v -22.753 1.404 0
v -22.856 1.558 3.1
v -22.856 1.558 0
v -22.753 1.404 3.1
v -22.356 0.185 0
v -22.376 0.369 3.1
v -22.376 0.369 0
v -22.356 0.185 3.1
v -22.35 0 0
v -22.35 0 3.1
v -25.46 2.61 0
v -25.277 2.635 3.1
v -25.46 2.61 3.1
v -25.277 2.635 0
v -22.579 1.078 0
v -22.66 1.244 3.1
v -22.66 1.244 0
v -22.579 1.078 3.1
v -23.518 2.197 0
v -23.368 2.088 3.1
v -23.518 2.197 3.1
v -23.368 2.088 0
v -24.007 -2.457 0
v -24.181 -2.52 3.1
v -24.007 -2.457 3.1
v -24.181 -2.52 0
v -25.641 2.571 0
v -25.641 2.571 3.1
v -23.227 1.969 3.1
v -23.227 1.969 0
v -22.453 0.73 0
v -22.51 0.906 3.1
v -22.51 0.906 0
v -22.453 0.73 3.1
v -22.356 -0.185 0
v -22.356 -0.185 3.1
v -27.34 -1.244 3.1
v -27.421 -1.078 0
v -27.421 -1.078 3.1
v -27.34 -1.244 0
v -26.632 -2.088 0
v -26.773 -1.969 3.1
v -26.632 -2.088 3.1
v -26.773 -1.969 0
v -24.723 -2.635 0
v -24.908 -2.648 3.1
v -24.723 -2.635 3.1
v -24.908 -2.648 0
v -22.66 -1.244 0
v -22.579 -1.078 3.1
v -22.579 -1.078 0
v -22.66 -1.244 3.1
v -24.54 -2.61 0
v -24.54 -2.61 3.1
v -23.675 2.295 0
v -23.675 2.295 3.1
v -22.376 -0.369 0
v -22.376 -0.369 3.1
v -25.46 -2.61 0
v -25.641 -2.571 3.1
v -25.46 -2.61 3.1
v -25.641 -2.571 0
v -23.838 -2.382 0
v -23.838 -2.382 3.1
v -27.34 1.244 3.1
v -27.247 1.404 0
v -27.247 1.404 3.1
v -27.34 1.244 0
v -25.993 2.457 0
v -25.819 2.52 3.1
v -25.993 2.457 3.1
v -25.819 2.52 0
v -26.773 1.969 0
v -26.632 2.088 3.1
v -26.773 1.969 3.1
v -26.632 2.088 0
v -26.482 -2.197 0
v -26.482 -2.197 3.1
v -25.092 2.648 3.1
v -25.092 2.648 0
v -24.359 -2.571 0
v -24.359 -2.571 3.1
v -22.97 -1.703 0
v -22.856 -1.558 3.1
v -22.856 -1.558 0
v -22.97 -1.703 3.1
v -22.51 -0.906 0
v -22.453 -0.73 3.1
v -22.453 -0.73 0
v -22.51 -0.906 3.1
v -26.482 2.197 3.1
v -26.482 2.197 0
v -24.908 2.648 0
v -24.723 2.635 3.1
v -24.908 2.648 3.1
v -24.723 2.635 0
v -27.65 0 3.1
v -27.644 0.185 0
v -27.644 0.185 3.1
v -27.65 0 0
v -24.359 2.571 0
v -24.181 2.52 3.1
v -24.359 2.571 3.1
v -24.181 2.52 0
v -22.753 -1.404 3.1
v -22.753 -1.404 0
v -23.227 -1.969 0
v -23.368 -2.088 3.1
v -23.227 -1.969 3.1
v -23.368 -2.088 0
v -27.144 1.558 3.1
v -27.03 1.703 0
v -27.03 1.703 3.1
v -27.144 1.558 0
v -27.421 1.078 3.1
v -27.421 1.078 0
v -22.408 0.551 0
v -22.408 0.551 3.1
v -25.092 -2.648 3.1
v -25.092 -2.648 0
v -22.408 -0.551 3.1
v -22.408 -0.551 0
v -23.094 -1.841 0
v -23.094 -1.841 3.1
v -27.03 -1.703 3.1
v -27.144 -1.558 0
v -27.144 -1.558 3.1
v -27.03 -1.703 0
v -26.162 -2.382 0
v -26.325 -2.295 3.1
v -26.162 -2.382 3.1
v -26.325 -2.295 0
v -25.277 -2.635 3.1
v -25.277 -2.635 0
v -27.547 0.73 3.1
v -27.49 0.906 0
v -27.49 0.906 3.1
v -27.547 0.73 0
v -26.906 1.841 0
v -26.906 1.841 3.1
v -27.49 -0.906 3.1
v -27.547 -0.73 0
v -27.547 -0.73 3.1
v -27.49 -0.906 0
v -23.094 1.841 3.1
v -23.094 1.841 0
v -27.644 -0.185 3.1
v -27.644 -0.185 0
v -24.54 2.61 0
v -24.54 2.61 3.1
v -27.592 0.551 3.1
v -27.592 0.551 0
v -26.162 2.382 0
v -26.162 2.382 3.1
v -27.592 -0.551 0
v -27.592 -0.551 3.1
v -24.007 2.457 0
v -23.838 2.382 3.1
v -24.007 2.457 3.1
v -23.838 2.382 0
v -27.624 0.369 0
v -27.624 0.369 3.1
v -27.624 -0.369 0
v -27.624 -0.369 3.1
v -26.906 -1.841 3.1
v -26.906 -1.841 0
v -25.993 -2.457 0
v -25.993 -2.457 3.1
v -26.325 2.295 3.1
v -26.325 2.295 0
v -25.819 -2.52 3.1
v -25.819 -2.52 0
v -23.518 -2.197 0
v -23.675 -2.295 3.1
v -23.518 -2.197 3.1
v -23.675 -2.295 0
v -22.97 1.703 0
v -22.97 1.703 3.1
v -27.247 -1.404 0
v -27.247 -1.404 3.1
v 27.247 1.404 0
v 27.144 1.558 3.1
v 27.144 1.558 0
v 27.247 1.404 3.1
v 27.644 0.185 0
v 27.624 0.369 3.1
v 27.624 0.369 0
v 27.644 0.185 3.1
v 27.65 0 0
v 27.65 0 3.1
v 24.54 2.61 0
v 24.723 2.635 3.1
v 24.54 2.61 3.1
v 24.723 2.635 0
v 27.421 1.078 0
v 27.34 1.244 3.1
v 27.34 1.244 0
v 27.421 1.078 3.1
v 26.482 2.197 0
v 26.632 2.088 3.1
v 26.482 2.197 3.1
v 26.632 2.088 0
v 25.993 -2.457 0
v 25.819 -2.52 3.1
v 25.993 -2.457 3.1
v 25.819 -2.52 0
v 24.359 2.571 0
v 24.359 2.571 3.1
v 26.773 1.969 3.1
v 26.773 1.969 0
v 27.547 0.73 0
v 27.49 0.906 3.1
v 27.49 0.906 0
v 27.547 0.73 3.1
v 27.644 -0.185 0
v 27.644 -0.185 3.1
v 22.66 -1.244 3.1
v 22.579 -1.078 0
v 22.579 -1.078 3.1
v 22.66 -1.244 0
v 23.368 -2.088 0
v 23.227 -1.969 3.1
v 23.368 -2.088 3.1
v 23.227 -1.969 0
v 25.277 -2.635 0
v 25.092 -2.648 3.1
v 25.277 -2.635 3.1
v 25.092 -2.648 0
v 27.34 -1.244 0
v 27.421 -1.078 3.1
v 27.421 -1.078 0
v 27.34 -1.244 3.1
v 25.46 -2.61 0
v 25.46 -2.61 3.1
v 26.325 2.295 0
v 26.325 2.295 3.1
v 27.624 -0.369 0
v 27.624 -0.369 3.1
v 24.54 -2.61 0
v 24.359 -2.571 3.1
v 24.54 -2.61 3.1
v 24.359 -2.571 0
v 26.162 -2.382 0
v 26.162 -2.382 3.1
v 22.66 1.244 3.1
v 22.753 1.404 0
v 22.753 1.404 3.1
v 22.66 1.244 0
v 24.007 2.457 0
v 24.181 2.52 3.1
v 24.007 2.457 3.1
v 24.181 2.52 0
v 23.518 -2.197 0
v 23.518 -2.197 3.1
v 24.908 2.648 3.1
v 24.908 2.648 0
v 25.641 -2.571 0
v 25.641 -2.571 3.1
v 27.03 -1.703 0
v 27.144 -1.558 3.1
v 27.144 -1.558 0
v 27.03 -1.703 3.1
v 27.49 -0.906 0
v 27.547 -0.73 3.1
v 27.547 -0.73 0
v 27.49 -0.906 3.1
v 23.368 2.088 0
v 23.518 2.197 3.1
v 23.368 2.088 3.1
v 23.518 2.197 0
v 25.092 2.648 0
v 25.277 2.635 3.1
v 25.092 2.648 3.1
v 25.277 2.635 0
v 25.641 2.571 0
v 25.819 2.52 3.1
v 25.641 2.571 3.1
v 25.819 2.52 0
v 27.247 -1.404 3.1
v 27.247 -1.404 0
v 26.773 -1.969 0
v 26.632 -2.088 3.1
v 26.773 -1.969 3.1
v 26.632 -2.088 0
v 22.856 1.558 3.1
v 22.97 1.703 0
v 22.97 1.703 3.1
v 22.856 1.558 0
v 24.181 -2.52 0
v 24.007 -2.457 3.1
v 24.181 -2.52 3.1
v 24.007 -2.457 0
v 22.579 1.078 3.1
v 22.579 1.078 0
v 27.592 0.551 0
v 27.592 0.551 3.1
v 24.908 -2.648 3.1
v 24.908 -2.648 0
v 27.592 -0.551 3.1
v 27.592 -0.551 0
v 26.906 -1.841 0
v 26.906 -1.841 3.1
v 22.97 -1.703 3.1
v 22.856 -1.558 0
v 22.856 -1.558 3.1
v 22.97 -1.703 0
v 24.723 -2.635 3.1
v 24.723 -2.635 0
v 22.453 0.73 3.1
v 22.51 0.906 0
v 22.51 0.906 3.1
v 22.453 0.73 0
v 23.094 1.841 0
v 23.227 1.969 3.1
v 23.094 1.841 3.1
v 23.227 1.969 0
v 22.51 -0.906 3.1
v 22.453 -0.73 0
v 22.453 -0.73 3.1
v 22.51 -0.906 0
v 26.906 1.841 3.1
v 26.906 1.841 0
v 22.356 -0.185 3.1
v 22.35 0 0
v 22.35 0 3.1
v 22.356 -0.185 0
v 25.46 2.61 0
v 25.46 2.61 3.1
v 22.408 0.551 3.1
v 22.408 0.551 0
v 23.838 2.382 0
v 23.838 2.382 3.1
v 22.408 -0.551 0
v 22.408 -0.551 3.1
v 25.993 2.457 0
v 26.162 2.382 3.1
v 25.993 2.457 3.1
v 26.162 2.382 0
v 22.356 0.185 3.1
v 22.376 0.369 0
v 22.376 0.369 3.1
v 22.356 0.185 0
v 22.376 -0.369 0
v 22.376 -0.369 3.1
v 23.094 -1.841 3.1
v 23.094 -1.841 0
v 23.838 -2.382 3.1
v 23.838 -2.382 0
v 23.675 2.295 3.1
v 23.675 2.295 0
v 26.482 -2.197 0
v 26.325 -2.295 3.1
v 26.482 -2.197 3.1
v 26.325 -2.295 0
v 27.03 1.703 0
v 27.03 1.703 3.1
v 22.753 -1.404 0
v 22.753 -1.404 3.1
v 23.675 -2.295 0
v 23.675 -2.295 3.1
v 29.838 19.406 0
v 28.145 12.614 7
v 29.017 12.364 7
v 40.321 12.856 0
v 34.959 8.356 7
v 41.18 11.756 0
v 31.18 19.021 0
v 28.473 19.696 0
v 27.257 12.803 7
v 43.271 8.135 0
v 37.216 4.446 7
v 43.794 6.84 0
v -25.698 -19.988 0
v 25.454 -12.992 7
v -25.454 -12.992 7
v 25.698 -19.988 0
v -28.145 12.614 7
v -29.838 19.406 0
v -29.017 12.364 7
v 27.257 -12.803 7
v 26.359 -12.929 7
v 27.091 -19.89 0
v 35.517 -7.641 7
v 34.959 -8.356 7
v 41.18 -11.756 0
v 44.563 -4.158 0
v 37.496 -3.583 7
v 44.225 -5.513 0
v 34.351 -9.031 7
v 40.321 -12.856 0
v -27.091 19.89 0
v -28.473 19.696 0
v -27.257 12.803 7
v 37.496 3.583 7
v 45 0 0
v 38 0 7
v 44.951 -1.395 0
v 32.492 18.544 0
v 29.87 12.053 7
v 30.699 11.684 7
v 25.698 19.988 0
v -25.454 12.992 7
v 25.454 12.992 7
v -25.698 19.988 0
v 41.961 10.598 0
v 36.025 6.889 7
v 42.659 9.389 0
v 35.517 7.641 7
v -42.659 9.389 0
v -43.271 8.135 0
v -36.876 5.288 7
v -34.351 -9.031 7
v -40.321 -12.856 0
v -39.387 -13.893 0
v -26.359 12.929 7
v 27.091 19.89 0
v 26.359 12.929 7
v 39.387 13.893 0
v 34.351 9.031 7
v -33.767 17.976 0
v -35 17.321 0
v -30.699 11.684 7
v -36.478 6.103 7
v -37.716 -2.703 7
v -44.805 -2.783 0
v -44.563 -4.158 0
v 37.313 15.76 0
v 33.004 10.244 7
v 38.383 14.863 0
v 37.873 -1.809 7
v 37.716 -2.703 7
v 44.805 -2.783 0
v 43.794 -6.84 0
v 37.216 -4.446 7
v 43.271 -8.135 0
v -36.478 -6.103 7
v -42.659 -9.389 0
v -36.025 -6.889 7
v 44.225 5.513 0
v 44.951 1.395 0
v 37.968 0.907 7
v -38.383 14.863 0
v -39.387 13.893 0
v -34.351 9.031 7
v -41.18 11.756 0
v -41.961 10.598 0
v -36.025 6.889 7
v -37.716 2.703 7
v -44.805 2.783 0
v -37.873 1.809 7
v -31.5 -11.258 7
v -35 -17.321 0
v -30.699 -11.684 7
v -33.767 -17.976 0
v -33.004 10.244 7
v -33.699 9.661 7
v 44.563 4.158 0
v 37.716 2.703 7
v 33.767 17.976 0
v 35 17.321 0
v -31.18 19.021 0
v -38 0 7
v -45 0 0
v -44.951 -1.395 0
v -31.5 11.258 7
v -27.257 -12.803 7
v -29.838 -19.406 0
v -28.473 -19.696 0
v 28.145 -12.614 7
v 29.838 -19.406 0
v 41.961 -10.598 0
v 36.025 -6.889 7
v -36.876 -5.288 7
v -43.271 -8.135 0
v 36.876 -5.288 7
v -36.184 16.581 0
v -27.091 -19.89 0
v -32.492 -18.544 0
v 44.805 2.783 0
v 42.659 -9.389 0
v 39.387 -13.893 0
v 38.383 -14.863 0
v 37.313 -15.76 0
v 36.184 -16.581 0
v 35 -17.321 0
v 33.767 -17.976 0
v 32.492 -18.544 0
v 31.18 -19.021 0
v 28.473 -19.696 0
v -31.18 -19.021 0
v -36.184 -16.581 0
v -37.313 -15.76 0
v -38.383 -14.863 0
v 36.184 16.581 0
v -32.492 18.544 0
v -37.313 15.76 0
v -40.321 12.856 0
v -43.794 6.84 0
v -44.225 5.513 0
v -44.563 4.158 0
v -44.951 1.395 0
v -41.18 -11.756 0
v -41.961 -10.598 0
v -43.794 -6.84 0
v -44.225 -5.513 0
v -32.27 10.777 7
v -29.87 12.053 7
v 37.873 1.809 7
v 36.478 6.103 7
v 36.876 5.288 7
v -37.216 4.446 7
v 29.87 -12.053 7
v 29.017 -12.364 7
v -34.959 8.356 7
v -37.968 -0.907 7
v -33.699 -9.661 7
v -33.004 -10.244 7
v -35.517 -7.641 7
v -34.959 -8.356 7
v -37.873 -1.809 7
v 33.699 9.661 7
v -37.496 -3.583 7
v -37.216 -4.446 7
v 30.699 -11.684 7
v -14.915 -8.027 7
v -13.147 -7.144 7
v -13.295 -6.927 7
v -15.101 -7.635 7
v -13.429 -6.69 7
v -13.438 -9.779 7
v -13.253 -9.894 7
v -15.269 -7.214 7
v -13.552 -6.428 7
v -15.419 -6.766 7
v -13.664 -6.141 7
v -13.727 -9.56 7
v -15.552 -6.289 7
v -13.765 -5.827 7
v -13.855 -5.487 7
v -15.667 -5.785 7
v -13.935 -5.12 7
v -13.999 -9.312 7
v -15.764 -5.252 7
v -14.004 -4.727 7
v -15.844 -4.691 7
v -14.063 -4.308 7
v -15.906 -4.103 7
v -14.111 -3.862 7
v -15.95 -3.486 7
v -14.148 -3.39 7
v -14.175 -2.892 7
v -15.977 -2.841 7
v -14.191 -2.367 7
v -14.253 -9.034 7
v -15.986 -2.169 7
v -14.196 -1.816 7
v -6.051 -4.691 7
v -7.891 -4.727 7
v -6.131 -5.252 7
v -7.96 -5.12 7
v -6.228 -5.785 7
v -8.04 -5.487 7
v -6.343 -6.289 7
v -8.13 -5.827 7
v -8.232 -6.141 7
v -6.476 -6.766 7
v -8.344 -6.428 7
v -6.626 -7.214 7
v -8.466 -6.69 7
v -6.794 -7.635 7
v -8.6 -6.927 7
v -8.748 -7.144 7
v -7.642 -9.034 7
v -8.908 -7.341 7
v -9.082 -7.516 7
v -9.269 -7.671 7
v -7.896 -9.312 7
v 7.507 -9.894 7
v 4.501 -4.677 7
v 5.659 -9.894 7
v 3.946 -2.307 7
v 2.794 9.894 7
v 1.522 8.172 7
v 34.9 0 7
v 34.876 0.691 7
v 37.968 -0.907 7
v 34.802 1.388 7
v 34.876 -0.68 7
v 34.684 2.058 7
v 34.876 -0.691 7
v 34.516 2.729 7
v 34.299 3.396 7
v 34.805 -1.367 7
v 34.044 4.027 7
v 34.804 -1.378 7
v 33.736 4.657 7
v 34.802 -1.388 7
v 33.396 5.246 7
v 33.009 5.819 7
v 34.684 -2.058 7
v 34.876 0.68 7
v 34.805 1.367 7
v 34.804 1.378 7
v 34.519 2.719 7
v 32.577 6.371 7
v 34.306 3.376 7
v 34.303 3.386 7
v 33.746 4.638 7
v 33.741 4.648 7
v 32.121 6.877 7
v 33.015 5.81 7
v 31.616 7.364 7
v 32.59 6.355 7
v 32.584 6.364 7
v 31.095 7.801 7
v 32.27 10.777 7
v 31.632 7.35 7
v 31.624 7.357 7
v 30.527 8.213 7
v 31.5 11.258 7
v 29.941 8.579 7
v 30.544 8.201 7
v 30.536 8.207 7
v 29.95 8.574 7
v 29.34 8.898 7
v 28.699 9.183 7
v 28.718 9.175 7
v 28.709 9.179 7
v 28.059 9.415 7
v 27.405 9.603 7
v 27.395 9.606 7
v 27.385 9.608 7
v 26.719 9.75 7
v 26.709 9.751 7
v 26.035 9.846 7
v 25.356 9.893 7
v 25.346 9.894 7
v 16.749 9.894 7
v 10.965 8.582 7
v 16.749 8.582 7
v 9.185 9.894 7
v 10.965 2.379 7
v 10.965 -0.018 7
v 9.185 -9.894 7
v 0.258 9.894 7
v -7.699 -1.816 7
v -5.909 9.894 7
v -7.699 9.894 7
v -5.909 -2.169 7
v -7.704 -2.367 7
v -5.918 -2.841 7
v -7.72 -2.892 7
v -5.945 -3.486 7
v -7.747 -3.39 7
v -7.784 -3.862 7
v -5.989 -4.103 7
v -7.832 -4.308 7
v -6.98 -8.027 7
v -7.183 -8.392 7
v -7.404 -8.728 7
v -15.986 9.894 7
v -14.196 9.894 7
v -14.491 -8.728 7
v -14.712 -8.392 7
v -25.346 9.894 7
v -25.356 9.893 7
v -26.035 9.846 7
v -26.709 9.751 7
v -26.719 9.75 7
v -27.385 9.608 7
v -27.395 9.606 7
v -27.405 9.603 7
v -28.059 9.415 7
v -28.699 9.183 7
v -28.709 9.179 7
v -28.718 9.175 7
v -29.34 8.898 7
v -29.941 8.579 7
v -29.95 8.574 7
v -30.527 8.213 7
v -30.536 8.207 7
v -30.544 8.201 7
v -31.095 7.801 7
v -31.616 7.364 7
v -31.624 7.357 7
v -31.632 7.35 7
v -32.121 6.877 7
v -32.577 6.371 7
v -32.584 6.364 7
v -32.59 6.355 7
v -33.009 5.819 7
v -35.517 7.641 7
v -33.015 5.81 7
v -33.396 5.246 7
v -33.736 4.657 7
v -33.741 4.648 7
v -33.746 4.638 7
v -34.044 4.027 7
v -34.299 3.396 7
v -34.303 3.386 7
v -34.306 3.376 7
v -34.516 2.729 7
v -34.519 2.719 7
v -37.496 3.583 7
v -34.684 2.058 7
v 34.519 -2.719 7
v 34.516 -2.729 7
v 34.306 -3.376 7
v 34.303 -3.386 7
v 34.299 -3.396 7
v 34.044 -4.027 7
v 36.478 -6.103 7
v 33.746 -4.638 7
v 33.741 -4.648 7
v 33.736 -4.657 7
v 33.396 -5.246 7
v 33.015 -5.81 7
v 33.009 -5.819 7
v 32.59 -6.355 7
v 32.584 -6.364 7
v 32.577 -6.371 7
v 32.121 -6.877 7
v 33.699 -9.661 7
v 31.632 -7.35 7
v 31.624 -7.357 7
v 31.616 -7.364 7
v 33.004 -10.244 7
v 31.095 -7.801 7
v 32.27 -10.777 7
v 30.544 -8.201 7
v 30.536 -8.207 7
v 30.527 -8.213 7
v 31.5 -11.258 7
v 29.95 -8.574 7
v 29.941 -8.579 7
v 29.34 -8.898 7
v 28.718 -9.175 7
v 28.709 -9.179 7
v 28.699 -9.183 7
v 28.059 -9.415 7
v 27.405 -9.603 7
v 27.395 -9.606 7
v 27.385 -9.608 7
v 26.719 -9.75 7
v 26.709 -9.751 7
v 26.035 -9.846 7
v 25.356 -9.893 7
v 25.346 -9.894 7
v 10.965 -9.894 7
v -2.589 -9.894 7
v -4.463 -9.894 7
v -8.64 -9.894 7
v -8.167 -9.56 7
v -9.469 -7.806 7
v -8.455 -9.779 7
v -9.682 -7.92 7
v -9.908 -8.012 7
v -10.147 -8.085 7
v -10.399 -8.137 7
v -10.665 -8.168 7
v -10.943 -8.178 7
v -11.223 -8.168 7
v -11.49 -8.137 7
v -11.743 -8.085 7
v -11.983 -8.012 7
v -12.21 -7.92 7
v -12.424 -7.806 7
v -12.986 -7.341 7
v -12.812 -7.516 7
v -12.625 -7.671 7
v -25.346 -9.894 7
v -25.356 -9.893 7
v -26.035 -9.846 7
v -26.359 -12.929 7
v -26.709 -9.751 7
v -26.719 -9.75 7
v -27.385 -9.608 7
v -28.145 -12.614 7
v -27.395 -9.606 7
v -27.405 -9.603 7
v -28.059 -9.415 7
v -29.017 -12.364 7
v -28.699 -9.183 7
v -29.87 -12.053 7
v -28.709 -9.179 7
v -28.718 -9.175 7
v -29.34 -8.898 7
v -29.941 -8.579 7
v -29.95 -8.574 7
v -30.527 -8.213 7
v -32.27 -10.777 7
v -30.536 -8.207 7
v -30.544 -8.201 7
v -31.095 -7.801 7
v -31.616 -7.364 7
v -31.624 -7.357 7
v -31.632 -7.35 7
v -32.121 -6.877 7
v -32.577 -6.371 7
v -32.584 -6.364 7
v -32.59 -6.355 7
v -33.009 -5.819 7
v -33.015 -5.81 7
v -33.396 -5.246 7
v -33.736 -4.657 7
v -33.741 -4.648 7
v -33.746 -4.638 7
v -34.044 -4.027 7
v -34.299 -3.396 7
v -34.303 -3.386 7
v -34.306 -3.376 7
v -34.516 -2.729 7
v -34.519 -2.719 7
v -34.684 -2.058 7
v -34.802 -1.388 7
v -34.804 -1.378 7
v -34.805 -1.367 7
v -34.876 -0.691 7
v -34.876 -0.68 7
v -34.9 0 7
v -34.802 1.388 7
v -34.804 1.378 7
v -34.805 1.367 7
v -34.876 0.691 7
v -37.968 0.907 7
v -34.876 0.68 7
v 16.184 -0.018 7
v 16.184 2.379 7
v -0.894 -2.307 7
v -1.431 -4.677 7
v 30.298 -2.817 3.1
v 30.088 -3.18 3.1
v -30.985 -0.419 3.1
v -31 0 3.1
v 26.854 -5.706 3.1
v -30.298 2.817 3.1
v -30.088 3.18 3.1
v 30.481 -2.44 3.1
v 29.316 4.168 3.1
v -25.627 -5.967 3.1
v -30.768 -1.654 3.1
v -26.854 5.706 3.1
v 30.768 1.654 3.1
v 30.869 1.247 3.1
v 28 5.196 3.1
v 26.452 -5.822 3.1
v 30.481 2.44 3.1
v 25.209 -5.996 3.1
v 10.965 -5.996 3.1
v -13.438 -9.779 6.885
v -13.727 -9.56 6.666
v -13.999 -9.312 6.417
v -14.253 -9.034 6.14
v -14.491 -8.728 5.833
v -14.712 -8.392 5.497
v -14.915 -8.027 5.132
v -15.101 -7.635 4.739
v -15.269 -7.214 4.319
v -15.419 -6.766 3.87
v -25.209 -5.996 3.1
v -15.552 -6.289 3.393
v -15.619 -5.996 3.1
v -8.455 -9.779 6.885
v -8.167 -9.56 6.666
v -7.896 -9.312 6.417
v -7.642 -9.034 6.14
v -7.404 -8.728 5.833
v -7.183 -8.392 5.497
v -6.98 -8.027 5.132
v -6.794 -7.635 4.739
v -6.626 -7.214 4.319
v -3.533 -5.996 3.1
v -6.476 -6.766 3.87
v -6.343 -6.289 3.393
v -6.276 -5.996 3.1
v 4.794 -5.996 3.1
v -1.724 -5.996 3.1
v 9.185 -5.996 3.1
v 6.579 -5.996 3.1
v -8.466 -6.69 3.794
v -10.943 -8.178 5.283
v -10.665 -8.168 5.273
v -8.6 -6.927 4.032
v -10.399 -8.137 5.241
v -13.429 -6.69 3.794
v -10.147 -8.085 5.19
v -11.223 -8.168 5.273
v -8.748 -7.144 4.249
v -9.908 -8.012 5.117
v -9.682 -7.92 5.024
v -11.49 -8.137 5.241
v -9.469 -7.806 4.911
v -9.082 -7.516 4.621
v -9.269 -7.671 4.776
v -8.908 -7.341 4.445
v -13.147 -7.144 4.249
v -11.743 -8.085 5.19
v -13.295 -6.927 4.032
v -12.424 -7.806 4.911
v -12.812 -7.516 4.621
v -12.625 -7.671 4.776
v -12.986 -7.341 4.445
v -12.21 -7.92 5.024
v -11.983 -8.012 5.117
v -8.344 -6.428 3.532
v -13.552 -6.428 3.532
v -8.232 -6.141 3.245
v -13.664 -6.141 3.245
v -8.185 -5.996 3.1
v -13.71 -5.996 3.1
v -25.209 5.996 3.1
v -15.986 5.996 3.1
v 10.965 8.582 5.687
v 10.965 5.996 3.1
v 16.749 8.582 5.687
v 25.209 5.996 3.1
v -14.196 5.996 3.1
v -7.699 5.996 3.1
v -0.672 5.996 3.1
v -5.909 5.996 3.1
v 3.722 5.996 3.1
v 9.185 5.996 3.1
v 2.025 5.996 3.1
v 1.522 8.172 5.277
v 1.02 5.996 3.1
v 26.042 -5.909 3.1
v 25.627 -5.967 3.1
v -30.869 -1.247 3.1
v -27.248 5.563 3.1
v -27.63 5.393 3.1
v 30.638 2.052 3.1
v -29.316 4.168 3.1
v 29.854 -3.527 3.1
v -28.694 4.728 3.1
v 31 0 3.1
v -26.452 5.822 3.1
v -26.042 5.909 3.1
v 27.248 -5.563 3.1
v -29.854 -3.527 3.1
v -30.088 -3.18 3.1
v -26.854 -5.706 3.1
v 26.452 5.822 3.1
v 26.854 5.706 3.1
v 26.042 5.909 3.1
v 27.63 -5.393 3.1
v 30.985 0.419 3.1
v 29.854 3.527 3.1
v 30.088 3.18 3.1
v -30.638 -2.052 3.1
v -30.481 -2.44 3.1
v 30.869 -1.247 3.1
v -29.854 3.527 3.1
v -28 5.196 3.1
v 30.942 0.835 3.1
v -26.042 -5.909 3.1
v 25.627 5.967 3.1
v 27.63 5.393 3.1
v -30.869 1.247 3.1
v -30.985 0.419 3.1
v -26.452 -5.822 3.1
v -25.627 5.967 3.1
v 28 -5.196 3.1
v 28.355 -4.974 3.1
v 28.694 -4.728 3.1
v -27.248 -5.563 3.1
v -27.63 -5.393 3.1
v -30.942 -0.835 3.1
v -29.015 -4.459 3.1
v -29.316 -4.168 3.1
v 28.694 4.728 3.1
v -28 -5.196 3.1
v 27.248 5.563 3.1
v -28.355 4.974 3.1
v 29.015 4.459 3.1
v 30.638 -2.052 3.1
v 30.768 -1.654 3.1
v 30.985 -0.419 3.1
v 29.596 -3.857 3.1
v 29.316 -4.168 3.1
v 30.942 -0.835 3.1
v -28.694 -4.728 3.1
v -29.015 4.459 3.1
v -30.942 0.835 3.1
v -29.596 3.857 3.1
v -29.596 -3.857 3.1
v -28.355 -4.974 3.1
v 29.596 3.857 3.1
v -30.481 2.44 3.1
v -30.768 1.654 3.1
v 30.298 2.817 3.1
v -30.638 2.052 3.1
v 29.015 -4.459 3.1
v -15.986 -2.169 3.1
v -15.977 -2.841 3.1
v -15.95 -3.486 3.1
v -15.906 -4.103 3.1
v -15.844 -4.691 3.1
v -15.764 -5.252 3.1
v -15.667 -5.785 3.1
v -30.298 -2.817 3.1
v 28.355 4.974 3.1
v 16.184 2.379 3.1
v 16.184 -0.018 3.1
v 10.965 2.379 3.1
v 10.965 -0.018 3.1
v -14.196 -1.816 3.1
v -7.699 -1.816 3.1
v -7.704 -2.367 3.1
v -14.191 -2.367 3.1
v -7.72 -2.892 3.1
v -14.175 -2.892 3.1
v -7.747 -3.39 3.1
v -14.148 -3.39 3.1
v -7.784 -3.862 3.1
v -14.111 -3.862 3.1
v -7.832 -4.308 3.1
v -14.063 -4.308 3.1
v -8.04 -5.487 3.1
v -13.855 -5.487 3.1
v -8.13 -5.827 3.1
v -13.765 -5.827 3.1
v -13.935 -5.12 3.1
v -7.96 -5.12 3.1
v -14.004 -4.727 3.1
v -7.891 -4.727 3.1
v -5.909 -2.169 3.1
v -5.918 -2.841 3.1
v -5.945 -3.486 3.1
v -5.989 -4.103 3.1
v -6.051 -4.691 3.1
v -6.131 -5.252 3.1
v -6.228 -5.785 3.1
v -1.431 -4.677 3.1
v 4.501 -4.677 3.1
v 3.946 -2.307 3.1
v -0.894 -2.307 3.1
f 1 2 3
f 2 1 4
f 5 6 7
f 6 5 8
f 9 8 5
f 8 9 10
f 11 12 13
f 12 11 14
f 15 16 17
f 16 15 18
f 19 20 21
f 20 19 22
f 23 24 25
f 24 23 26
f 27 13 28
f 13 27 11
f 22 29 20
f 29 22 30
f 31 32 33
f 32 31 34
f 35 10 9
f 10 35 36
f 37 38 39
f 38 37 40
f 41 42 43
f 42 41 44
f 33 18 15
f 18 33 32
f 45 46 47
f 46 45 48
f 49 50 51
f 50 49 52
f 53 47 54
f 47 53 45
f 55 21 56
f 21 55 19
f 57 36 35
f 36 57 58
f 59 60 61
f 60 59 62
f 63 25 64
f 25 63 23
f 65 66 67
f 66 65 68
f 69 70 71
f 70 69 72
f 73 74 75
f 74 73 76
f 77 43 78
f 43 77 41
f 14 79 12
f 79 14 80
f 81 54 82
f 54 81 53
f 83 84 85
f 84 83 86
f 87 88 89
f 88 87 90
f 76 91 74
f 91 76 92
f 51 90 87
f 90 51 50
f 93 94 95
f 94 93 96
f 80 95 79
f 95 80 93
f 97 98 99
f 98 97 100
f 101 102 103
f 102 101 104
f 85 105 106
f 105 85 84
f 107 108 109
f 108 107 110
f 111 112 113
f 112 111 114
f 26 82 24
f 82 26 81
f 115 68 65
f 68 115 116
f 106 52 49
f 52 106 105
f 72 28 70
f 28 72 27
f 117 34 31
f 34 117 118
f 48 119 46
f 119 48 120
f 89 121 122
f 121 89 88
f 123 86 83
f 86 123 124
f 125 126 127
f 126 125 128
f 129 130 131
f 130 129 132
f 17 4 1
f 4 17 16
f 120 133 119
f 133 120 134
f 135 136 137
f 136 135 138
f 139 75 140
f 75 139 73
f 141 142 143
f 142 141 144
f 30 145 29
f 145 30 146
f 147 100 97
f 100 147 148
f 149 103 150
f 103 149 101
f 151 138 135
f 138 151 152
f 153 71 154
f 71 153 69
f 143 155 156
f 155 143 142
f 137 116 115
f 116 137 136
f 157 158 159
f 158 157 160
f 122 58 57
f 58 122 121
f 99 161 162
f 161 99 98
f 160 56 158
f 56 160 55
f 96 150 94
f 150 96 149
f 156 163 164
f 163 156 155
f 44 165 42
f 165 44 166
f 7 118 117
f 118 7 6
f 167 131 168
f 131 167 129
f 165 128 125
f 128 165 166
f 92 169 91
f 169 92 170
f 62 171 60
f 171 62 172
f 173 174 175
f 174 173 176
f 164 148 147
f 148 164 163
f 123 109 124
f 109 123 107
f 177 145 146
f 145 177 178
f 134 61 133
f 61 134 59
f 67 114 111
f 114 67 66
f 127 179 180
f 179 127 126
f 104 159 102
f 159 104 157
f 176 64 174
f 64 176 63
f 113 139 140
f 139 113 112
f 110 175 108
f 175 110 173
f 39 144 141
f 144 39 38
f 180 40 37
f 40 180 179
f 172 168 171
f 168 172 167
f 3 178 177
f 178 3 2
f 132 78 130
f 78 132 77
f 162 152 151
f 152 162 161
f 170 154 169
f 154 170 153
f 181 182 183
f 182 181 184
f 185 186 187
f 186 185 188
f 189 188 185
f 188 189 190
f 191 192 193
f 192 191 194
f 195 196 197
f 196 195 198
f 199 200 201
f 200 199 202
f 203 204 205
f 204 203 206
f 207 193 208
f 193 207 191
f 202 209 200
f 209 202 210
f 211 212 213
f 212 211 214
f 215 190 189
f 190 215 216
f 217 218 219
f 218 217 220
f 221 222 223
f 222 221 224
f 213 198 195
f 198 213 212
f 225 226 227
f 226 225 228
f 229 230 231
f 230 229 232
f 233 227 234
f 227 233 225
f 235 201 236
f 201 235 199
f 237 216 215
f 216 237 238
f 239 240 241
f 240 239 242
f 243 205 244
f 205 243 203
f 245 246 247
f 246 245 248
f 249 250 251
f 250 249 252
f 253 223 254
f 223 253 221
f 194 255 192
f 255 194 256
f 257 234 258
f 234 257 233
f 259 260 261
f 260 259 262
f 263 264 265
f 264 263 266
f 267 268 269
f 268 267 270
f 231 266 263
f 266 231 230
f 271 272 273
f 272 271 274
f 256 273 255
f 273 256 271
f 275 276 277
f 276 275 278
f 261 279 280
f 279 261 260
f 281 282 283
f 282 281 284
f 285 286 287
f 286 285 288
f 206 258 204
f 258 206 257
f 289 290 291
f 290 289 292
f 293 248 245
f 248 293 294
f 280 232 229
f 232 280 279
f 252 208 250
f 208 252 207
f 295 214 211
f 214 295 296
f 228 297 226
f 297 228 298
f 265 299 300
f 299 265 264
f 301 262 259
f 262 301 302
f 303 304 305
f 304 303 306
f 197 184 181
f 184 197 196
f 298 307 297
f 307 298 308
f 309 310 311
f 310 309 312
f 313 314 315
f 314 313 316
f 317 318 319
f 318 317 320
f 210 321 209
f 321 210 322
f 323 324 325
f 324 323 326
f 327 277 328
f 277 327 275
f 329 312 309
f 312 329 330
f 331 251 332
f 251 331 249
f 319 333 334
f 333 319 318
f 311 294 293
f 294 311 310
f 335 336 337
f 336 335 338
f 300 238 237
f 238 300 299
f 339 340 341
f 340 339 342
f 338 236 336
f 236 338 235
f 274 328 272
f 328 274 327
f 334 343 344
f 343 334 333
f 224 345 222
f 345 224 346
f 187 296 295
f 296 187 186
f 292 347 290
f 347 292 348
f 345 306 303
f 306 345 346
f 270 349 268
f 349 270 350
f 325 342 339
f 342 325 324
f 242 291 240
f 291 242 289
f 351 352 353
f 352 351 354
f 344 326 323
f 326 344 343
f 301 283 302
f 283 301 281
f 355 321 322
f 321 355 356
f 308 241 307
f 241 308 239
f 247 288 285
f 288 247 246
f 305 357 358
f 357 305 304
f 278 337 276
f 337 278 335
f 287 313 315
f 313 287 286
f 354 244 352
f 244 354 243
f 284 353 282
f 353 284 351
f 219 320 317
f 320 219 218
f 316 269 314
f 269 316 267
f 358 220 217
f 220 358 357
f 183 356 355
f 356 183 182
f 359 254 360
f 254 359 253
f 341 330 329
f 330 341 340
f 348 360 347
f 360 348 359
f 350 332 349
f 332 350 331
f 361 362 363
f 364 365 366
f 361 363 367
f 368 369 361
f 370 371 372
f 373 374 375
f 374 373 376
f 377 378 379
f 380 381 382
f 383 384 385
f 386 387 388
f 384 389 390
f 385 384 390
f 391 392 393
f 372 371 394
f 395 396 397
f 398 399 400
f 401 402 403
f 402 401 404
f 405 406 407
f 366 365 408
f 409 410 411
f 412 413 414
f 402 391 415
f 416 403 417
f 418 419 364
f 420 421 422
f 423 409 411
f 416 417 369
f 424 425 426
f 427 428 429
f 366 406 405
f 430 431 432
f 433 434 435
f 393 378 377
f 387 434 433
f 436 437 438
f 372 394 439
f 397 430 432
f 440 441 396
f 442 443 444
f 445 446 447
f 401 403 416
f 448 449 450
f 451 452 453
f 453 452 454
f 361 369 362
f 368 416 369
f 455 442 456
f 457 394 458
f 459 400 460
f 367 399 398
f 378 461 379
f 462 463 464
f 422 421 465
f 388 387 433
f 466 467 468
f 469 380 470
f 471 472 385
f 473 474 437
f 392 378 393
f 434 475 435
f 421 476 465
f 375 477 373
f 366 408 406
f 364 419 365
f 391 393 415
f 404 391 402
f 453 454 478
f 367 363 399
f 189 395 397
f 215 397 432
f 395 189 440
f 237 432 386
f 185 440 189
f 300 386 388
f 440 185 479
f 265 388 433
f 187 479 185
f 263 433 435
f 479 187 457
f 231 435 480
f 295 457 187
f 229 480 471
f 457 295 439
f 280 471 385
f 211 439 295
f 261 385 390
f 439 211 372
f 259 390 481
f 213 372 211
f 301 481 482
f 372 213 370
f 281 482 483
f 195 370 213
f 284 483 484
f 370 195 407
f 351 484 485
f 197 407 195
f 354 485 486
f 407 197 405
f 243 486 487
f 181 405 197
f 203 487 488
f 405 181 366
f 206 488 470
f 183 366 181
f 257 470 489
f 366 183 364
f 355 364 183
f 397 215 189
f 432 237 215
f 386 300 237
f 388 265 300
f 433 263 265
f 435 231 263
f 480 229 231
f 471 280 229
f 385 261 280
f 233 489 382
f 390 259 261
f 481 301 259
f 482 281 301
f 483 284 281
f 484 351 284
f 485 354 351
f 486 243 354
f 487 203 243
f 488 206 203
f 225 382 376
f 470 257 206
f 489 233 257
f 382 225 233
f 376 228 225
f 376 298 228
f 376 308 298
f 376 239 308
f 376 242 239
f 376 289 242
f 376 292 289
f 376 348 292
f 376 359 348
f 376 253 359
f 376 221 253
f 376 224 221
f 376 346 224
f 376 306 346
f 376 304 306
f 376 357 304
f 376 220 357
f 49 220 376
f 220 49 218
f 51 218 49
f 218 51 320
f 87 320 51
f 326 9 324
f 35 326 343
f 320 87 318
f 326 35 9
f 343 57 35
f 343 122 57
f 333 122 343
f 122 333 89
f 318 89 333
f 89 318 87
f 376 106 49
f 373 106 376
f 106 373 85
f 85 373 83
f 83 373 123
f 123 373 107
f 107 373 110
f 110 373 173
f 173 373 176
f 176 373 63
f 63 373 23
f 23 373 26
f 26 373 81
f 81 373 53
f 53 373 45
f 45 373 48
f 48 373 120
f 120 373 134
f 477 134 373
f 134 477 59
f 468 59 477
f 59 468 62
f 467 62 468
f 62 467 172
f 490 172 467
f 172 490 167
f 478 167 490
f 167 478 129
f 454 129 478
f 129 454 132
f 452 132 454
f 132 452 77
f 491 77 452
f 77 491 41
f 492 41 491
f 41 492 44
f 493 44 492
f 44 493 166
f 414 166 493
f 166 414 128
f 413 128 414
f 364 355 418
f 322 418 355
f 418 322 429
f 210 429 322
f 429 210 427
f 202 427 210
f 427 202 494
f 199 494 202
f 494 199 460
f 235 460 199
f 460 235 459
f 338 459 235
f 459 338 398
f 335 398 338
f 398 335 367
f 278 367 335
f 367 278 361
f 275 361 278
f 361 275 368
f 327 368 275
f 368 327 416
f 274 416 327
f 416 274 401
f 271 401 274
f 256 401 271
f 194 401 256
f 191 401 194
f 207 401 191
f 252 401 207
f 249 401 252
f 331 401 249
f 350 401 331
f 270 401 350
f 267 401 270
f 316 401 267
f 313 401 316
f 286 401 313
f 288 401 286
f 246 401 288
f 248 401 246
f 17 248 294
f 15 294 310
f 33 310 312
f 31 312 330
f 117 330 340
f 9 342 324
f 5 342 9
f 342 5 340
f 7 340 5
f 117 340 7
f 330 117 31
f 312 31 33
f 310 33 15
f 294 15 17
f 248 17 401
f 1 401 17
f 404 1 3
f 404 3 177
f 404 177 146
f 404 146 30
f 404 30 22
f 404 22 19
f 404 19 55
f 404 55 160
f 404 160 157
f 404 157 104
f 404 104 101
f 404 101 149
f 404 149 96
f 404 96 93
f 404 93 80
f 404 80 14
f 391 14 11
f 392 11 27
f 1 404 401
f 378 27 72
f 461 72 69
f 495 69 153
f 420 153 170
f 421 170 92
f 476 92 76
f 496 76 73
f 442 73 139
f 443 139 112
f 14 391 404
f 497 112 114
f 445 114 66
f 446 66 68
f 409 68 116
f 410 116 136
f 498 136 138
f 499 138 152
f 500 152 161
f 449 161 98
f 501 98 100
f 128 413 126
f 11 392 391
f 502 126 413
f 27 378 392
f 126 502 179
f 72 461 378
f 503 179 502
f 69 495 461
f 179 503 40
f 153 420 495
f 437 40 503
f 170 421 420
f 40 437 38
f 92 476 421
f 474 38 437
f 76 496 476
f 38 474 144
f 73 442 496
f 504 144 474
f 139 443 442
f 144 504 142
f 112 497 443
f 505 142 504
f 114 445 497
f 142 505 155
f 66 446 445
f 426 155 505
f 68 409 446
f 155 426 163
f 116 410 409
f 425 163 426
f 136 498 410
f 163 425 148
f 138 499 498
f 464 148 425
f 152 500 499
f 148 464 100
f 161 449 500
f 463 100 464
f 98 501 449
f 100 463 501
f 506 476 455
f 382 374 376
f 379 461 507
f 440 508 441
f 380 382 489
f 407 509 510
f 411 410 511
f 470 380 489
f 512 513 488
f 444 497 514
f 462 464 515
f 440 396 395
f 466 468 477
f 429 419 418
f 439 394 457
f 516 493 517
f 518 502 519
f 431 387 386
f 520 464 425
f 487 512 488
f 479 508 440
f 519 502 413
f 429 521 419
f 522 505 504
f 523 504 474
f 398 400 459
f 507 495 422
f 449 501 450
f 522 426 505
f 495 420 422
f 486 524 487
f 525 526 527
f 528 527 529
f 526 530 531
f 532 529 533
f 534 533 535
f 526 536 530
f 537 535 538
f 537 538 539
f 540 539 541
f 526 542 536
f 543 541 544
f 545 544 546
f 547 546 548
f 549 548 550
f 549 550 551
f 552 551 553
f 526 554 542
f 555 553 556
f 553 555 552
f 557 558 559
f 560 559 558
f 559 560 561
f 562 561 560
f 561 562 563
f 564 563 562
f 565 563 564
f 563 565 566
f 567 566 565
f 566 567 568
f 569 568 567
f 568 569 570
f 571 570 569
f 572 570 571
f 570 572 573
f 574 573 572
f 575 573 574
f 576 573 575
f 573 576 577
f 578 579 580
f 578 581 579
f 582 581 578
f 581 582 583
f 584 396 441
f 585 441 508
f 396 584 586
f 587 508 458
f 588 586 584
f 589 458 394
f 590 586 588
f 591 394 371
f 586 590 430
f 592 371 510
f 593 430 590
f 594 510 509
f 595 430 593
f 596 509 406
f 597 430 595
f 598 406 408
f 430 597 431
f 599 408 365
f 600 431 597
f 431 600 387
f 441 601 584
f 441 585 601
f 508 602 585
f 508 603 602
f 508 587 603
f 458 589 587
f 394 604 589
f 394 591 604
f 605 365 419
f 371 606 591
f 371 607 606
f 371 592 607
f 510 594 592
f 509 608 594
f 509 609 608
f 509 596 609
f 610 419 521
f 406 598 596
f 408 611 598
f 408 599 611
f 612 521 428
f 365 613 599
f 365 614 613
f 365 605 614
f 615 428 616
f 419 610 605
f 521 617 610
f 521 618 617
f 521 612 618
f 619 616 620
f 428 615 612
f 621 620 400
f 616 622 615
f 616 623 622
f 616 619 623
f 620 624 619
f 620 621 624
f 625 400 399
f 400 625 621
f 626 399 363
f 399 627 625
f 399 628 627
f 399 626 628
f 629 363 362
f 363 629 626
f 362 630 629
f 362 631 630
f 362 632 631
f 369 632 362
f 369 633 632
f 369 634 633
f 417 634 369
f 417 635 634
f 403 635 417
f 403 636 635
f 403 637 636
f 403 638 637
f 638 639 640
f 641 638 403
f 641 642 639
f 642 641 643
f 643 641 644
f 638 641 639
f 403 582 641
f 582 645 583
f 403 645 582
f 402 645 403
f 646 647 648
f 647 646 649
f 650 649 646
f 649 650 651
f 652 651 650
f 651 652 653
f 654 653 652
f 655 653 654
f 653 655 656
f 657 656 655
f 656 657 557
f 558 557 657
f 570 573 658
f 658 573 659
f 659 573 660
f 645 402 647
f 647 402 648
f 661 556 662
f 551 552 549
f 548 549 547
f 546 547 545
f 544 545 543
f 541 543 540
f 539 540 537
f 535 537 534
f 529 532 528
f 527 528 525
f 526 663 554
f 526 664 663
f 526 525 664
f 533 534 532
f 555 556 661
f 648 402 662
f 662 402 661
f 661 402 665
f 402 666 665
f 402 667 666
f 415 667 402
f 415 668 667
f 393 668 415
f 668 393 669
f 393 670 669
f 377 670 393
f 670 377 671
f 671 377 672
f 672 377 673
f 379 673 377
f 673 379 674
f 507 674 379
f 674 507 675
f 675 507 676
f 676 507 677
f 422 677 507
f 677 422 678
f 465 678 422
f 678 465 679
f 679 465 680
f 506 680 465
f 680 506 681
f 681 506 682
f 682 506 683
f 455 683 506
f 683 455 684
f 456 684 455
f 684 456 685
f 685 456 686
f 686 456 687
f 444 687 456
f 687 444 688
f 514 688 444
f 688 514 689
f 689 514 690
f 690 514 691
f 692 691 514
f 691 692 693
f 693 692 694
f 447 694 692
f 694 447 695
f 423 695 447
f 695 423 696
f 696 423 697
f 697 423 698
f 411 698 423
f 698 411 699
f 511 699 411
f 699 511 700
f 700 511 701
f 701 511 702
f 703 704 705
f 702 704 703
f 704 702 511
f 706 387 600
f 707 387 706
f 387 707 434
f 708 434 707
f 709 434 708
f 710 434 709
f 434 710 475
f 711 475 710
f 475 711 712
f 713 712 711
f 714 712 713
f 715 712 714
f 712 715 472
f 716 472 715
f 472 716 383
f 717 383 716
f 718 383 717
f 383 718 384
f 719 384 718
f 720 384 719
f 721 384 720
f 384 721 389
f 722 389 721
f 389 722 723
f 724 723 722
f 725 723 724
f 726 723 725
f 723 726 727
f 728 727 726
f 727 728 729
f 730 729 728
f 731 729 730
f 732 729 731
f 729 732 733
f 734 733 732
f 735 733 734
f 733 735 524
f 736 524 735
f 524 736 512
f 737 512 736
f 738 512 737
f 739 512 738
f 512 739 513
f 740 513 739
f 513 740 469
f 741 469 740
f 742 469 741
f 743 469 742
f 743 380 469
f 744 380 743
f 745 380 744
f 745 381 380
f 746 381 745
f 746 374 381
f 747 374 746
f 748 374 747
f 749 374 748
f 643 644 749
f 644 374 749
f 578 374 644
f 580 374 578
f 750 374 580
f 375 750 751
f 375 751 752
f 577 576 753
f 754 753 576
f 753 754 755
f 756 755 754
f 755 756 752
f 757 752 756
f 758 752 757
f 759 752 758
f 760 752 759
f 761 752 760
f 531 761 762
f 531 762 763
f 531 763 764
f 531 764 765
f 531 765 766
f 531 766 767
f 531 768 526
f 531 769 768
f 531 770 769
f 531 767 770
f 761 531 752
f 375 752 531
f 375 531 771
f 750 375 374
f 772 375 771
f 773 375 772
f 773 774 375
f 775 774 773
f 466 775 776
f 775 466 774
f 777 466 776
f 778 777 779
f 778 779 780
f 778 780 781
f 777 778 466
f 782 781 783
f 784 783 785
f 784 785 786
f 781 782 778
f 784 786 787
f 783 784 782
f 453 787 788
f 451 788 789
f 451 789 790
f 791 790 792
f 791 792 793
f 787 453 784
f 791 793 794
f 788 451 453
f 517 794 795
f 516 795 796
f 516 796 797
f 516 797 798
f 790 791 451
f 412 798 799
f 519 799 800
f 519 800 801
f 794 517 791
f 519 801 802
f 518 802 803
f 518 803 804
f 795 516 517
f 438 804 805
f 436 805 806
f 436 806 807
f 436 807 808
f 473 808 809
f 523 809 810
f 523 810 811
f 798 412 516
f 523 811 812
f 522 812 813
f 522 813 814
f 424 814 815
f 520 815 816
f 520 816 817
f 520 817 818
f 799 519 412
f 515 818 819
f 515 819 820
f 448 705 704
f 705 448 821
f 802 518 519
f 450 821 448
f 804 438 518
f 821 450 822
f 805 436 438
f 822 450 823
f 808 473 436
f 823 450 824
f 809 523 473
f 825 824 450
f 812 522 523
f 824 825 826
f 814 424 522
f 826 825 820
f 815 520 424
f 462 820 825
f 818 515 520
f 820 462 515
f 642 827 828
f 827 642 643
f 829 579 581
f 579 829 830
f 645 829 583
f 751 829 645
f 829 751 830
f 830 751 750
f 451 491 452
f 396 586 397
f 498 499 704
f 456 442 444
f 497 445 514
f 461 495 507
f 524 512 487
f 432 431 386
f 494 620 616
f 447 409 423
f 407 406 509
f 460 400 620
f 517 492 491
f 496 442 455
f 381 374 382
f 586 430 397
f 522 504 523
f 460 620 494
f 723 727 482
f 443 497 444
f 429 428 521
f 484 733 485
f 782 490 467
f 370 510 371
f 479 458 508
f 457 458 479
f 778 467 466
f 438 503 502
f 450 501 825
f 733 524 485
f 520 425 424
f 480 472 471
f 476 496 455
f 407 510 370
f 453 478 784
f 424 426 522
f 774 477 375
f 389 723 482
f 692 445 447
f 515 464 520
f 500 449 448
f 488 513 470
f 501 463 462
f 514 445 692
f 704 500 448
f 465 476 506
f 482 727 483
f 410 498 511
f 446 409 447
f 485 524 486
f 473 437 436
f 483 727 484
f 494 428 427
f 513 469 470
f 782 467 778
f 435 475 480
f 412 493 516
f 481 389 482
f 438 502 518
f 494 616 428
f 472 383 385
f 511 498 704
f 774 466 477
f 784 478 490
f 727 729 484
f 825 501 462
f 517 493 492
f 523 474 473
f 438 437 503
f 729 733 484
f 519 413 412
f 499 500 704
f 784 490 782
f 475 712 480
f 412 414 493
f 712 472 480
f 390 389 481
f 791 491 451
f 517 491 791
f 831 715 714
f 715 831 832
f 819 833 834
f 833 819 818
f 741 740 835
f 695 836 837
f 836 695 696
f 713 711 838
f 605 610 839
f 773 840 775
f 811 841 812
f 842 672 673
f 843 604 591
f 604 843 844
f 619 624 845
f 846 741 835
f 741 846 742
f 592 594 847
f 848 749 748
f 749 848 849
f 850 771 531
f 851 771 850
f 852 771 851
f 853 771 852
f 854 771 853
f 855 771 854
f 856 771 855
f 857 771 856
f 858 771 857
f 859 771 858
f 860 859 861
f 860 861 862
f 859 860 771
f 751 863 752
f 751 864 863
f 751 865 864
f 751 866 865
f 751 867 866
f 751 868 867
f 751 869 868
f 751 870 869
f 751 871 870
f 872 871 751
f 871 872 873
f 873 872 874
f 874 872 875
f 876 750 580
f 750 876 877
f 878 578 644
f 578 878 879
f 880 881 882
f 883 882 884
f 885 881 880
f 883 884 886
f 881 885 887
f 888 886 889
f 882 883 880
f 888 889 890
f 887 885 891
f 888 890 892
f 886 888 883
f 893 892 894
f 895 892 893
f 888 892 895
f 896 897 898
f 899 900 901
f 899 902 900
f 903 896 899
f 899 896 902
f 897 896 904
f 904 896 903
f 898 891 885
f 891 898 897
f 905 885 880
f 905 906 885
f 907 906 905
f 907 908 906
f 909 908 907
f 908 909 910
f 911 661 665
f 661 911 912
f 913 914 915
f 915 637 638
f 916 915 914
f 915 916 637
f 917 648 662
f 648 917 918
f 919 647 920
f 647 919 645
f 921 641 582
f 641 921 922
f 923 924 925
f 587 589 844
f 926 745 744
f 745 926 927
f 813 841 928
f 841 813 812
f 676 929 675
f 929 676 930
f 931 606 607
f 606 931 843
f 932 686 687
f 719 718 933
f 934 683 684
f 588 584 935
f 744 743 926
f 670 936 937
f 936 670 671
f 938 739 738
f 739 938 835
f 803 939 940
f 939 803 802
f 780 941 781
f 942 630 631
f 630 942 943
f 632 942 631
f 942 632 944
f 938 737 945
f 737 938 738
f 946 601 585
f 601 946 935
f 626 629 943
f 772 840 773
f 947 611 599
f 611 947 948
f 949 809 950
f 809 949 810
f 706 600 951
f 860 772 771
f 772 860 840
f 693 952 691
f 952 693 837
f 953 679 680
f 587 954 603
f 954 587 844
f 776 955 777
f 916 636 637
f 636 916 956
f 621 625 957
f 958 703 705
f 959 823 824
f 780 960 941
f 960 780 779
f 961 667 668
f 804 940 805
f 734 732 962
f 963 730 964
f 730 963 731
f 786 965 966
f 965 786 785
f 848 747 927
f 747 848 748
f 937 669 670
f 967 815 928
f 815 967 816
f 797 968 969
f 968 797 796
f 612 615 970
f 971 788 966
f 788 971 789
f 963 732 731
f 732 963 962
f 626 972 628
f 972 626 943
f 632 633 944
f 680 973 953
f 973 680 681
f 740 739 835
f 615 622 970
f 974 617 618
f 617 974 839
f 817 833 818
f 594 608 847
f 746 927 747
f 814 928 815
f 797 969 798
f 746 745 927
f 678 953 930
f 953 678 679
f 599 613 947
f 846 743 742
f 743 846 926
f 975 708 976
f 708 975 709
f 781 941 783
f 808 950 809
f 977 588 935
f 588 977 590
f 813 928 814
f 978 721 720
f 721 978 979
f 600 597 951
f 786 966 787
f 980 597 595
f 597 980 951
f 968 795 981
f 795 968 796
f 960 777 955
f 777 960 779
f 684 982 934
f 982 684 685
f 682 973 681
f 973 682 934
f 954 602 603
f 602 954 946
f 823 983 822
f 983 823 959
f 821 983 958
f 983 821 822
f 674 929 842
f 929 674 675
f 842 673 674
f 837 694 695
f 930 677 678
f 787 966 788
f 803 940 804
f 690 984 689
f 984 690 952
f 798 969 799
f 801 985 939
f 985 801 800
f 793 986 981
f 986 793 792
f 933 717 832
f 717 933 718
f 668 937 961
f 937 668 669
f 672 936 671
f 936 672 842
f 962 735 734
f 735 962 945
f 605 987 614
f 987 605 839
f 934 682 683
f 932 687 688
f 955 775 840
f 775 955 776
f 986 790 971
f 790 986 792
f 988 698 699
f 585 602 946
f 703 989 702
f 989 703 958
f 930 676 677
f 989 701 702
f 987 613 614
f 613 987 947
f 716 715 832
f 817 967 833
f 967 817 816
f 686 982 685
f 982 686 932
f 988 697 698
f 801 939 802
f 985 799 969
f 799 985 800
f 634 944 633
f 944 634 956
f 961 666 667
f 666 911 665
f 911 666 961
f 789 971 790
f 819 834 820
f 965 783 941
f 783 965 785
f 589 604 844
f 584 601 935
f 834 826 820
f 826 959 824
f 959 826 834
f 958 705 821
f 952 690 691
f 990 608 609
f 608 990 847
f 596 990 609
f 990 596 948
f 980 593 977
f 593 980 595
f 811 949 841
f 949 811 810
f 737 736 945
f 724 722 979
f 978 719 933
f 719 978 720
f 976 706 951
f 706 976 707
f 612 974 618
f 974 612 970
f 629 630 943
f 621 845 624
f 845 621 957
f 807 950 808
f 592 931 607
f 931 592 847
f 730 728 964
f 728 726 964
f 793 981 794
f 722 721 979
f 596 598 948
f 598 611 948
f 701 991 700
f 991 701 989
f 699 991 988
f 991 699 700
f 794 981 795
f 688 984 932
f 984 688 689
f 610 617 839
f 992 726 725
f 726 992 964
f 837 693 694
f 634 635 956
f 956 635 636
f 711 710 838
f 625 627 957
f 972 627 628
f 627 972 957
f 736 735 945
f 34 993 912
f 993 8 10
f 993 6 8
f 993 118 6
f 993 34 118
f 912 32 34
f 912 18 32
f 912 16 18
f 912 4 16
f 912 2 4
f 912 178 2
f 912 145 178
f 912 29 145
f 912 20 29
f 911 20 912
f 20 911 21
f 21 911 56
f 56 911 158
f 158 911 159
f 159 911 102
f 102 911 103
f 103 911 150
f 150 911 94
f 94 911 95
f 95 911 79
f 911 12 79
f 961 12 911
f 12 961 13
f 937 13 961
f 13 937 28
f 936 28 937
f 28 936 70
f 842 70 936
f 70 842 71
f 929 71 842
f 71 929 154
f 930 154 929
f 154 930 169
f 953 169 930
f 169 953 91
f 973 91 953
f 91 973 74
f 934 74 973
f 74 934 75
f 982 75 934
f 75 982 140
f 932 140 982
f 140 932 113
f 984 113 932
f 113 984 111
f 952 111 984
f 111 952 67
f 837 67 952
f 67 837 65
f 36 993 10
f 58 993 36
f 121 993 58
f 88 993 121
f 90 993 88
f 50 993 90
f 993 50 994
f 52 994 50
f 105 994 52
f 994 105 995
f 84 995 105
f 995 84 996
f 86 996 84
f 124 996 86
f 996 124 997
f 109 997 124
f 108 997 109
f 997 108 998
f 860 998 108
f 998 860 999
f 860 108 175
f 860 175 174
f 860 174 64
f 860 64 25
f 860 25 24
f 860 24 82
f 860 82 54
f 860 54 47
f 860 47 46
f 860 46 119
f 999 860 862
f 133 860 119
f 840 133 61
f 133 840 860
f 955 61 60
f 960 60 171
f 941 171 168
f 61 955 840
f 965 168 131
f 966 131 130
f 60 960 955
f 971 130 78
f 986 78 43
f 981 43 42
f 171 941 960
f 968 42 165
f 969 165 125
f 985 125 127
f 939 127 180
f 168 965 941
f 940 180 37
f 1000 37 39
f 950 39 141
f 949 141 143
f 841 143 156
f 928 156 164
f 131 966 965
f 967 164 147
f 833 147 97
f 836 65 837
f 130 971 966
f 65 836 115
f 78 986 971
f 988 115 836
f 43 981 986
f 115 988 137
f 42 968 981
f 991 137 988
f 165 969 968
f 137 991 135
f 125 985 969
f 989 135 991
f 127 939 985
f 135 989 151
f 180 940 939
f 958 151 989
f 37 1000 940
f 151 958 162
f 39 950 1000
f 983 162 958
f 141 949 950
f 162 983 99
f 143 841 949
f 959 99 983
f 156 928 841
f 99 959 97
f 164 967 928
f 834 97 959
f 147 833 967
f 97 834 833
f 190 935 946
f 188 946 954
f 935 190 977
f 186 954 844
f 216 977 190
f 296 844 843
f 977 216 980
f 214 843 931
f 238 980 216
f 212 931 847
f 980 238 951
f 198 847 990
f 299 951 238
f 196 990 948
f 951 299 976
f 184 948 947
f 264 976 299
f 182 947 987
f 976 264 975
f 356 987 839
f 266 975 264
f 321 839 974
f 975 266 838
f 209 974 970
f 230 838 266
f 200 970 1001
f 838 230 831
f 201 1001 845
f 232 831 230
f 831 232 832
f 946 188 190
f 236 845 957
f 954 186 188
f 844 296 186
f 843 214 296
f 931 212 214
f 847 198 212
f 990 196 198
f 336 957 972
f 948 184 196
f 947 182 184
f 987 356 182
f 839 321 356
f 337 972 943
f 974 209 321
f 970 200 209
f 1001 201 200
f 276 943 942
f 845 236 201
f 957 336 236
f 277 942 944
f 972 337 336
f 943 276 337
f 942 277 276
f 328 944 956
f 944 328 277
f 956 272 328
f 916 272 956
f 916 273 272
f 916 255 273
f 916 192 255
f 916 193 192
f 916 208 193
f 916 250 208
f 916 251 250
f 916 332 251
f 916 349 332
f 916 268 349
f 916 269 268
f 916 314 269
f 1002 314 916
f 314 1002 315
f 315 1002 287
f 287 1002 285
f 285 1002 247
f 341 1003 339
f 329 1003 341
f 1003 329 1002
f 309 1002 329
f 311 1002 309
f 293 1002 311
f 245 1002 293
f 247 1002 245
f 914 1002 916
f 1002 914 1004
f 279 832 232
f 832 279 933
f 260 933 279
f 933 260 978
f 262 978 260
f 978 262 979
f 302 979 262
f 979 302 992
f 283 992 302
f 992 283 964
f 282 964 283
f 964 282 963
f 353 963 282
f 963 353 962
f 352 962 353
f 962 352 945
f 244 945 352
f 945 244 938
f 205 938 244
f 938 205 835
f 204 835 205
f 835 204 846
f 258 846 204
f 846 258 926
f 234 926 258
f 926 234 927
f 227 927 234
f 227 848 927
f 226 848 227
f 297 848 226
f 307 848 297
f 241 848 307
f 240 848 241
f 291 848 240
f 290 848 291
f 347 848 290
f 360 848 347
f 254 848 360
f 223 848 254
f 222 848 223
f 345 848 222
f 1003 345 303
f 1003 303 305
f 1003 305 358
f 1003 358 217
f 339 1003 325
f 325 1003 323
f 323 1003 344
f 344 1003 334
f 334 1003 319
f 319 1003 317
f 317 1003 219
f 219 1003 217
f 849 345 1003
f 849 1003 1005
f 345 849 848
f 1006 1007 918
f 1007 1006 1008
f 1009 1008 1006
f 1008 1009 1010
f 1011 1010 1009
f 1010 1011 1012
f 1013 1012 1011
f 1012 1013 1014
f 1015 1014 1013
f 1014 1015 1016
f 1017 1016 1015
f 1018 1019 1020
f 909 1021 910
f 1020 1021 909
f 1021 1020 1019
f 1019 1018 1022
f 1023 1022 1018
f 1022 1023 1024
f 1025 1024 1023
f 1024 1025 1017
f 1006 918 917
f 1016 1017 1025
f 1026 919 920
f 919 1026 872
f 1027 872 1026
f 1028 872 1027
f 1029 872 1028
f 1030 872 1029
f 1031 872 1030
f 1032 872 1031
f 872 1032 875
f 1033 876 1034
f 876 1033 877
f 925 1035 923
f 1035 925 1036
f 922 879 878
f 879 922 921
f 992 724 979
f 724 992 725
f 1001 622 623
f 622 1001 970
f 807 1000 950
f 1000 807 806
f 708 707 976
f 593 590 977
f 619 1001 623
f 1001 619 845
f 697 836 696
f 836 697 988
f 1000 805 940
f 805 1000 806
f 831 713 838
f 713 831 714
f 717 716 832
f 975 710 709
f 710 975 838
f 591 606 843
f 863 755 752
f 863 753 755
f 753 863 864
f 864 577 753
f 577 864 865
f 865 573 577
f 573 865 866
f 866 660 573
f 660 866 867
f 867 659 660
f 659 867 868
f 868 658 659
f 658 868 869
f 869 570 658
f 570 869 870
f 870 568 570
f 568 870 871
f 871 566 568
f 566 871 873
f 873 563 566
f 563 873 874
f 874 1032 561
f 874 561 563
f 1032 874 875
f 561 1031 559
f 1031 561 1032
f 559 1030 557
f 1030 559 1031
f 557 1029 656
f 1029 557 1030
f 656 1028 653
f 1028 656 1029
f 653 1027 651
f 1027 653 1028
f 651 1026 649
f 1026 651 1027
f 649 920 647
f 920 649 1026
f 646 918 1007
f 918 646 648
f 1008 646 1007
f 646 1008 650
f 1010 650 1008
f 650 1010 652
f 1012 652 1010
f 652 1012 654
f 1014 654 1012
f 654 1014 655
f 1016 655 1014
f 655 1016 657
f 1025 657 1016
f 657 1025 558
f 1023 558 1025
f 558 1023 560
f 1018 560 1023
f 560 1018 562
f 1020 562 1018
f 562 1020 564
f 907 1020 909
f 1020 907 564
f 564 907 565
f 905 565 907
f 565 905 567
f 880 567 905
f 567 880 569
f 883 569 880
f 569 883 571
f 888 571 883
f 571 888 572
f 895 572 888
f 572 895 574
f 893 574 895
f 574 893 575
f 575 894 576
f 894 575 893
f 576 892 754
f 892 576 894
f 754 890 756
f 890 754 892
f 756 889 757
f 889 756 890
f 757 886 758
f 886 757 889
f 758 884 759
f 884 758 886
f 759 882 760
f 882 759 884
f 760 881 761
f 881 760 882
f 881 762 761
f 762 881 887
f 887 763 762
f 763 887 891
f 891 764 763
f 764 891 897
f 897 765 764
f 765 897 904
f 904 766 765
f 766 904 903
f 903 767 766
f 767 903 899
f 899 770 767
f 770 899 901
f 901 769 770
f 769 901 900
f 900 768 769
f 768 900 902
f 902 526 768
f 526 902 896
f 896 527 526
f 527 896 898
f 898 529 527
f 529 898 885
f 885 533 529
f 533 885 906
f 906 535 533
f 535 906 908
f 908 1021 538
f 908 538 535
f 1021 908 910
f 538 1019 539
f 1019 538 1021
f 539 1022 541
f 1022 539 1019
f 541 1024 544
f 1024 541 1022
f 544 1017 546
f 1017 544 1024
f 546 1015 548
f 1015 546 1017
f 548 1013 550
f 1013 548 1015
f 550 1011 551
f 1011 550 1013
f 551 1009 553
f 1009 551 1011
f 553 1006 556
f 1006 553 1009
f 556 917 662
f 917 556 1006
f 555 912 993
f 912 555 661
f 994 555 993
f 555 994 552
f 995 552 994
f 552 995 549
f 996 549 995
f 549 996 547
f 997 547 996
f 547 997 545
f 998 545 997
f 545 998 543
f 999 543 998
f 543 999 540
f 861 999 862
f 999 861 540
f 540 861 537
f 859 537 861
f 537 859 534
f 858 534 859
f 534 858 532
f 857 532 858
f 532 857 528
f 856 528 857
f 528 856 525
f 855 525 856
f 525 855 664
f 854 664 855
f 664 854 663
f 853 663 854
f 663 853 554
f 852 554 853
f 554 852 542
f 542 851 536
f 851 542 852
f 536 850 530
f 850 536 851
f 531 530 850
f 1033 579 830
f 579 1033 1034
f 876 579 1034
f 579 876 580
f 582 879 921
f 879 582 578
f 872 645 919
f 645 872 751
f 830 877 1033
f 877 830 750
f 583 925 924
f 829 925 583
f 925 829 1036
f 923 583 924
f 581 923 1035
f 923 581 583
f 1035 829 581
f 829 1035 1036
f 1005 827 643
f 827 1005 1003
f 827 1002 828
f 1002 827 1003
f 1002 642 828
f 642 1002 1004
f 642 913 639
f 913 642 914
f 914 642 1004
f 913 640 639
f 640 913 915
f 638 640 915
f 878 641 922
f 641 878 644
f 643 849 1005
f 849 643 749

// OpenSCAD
/*
 50mm spacing track grouser, with UAF logo.
*/

$fa=4;
$fs=0.1;

centerline=25;

module sidez() {
for (side=[-1,+1])
translate([side*centerline,0,0])
children();
}

module lozenge(OD,ht,slope=1.0) {

hull()
sidez()
{
	cylinder(d1=OD,d2=OD-2*ht*slope,h=ht);
}

}

panheadz=4;
panheadd=12;
overallz=panheadz+3;
difference() {
	lozenge(40,overallz);
	
	translate([0,0,overallz+0.1]) scale([1,1,-1])
		lozenge(panheadd+2*panheadz,panheadz);
	
	translate([0,0,-0.1])
	sidez() cylinder(d=5.3,h=overallz);
}


linear_extrude(height=overallz,convexity=10)
	scale([1,1.6,1])
	text("UAF",font="Arial Black",size=13,halign="center",valign="center");
